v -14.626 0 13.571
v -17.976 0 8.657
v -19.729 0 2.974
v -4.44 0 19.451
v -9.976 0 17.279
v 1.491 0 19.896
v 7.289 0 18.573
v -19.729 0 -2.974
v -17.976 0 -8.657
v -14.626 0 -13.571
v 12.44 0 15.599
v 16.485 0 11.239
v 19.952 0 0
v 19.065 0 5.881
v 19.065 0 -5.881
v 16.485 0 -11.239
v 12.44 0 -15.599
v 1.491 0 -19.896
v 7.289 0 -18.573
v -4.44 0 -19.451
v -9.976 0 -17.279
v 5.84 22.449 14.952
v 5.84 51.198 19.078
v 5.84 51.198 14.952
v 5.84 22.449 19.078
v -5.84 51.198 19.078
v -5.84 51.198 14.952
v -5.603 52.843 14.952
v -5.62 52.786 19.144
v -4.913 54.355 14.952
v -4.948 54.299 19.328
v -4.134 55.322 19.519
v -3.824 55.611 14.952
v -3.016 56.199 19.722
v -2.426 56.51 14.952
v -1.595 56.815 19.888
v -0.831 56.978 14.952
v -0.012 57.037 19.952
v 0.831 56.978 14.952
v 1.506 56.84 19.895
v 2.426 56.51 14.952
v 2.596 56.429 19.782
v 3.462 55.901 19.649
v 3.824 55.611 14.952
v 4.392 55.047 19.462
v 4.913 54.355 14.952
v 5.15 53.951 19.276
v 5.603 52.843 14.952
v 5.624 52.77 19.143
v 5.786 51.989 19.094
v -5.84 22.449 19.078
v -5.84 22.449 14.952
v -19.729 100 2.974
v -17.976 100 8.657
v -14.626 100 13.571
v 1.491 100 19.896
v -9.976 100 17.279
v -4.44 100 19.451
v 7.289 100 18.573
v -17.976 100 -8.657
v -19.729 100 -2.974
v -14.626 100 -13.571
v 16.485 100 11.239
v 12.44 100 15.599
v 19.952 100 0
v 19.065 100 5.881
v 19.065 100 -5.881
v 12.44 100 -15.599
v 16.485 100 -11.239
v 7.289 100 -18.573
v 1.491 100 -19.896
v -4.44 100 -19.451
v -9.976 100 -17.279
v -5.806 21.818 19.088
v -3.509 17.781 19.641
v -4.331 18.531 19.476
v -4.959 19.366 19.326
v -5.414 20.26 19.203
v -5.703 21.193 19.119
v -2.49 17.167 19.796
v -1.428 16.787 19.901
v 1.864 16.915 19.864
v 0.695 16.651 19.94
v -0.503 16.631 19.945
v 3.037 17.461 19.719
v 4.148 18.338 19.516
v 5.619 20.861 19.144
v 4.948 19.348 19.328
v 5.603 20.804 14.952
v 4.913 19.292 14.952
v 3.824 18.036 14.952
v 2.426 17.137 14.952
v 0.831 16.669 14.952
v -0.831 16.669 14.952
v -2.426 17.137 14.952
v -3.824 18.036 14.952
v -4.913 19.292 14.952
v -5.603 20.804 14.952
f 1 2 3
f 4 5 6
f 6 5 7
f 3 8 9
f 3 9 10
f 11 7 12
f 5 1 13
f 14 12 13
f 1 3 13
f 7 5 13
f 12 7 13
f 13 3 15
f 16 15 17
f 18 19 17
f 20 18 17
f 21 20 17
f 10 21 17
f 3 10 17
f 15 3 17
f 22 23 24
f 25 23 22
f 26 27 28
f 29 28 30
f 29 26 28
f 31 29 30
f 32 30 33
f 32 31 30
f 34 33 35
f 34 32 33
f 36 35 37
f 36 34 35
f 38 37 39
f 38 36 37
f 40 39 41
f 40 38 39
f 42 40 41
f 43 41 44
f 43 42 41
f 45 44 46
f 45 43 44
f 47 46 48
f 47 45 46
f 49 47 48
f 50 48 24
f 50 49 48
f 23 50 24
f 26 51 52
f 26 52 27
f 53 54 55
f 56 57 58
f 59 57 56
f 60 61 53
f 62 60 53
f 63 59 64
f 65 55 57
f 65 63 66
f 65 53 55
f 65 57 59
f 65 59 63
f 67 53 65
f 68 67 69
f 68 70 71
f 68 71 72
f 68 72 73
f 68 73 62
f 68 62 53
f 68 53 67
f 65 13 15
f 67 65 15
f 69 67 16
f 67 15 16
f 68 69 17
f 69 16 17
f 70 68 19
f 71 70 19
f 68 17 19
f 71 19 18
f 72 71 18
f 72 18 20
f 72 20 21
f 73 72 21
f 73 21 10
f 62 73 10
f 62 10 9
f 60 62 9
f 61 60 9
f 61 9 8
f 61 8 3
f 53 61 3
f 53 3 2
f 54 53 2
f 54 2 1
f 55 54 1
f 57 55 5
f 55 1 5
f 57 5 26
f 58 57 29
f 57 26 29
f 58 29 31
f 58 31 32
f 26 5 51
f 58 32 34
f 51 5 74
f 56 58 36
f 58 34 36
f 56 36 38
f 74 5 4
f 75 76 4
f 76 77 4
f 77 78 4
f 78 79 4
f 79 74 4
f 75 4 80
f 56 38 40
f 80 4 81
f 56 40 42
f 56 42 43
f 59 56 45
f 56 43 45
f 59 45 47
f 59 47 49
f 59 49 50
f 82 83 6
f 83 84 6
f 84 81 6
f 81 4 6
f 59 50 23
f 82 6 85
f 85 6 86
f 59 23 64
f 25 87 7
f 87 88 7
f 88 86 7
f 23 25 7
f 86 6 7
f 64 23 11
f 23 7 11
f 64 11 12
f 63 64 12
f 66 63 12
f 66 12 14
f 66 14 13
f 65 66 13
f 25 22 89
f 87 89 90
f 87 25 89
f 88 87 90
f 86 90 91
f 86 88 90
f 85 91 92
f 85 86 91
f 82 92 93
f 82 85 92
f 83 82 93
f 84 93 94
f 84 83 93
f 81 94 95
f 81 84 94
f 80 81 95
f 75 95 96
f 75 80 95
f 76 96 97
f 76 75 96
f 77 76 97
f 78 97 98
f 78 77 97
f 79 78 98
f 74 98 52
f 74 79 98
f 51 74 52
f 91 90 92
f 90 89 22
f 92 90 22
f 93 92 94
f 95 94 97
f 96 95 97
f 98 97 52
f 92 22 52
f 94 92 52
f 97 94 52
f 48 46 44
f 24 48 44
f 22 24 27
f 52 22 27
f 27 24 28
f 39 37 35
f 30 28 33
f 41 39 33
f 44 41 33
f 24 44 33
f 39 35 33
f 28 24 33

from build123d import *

# Parameters (mm, degrees)
SKETCH_1_R          = 19.95169504
EXTRUDE_1_DEPTH     = 100
CUT_EXTRUDE_1_DEPTH = 5


with BuildPart() as part:
    # 草图1 → 凸台-拉伸1 (new body)
    with BuildSketch(Plane(origin=(0, 0, 0), x_dir=(1, 0, 0), z_dir=(0, 1, 0))):
        Circle(SKETCH_1_R)
    extrude(amount=EXTRUDE_1_DEPTH)

    # 草图2 → 切除-拉伸1 (cut)
    with BuildSketch(Plane.XY.offset(19.95169504)):
        with BuildLine():
            Line((-5.839636377, 22.448895044), (-5.839636377, 51.197874129))
            ThreePointArc((-5.839636377, 51.197874129), (0, 57.037510505), (5.839636377, 51.197874129))
            Line((5.839636377, 51.197874129), (5.839636377, 22.448895044))
            ThreePointArc((5.839636377, 22.448895044), (0, 16.609258667), (-5.839636377, 22.448895044))
        make_face()
    extrude(amount=-CUT_EXTRUDE_1_DEPTH, mode=Mode.SUBTRACT)


solid = part.part
